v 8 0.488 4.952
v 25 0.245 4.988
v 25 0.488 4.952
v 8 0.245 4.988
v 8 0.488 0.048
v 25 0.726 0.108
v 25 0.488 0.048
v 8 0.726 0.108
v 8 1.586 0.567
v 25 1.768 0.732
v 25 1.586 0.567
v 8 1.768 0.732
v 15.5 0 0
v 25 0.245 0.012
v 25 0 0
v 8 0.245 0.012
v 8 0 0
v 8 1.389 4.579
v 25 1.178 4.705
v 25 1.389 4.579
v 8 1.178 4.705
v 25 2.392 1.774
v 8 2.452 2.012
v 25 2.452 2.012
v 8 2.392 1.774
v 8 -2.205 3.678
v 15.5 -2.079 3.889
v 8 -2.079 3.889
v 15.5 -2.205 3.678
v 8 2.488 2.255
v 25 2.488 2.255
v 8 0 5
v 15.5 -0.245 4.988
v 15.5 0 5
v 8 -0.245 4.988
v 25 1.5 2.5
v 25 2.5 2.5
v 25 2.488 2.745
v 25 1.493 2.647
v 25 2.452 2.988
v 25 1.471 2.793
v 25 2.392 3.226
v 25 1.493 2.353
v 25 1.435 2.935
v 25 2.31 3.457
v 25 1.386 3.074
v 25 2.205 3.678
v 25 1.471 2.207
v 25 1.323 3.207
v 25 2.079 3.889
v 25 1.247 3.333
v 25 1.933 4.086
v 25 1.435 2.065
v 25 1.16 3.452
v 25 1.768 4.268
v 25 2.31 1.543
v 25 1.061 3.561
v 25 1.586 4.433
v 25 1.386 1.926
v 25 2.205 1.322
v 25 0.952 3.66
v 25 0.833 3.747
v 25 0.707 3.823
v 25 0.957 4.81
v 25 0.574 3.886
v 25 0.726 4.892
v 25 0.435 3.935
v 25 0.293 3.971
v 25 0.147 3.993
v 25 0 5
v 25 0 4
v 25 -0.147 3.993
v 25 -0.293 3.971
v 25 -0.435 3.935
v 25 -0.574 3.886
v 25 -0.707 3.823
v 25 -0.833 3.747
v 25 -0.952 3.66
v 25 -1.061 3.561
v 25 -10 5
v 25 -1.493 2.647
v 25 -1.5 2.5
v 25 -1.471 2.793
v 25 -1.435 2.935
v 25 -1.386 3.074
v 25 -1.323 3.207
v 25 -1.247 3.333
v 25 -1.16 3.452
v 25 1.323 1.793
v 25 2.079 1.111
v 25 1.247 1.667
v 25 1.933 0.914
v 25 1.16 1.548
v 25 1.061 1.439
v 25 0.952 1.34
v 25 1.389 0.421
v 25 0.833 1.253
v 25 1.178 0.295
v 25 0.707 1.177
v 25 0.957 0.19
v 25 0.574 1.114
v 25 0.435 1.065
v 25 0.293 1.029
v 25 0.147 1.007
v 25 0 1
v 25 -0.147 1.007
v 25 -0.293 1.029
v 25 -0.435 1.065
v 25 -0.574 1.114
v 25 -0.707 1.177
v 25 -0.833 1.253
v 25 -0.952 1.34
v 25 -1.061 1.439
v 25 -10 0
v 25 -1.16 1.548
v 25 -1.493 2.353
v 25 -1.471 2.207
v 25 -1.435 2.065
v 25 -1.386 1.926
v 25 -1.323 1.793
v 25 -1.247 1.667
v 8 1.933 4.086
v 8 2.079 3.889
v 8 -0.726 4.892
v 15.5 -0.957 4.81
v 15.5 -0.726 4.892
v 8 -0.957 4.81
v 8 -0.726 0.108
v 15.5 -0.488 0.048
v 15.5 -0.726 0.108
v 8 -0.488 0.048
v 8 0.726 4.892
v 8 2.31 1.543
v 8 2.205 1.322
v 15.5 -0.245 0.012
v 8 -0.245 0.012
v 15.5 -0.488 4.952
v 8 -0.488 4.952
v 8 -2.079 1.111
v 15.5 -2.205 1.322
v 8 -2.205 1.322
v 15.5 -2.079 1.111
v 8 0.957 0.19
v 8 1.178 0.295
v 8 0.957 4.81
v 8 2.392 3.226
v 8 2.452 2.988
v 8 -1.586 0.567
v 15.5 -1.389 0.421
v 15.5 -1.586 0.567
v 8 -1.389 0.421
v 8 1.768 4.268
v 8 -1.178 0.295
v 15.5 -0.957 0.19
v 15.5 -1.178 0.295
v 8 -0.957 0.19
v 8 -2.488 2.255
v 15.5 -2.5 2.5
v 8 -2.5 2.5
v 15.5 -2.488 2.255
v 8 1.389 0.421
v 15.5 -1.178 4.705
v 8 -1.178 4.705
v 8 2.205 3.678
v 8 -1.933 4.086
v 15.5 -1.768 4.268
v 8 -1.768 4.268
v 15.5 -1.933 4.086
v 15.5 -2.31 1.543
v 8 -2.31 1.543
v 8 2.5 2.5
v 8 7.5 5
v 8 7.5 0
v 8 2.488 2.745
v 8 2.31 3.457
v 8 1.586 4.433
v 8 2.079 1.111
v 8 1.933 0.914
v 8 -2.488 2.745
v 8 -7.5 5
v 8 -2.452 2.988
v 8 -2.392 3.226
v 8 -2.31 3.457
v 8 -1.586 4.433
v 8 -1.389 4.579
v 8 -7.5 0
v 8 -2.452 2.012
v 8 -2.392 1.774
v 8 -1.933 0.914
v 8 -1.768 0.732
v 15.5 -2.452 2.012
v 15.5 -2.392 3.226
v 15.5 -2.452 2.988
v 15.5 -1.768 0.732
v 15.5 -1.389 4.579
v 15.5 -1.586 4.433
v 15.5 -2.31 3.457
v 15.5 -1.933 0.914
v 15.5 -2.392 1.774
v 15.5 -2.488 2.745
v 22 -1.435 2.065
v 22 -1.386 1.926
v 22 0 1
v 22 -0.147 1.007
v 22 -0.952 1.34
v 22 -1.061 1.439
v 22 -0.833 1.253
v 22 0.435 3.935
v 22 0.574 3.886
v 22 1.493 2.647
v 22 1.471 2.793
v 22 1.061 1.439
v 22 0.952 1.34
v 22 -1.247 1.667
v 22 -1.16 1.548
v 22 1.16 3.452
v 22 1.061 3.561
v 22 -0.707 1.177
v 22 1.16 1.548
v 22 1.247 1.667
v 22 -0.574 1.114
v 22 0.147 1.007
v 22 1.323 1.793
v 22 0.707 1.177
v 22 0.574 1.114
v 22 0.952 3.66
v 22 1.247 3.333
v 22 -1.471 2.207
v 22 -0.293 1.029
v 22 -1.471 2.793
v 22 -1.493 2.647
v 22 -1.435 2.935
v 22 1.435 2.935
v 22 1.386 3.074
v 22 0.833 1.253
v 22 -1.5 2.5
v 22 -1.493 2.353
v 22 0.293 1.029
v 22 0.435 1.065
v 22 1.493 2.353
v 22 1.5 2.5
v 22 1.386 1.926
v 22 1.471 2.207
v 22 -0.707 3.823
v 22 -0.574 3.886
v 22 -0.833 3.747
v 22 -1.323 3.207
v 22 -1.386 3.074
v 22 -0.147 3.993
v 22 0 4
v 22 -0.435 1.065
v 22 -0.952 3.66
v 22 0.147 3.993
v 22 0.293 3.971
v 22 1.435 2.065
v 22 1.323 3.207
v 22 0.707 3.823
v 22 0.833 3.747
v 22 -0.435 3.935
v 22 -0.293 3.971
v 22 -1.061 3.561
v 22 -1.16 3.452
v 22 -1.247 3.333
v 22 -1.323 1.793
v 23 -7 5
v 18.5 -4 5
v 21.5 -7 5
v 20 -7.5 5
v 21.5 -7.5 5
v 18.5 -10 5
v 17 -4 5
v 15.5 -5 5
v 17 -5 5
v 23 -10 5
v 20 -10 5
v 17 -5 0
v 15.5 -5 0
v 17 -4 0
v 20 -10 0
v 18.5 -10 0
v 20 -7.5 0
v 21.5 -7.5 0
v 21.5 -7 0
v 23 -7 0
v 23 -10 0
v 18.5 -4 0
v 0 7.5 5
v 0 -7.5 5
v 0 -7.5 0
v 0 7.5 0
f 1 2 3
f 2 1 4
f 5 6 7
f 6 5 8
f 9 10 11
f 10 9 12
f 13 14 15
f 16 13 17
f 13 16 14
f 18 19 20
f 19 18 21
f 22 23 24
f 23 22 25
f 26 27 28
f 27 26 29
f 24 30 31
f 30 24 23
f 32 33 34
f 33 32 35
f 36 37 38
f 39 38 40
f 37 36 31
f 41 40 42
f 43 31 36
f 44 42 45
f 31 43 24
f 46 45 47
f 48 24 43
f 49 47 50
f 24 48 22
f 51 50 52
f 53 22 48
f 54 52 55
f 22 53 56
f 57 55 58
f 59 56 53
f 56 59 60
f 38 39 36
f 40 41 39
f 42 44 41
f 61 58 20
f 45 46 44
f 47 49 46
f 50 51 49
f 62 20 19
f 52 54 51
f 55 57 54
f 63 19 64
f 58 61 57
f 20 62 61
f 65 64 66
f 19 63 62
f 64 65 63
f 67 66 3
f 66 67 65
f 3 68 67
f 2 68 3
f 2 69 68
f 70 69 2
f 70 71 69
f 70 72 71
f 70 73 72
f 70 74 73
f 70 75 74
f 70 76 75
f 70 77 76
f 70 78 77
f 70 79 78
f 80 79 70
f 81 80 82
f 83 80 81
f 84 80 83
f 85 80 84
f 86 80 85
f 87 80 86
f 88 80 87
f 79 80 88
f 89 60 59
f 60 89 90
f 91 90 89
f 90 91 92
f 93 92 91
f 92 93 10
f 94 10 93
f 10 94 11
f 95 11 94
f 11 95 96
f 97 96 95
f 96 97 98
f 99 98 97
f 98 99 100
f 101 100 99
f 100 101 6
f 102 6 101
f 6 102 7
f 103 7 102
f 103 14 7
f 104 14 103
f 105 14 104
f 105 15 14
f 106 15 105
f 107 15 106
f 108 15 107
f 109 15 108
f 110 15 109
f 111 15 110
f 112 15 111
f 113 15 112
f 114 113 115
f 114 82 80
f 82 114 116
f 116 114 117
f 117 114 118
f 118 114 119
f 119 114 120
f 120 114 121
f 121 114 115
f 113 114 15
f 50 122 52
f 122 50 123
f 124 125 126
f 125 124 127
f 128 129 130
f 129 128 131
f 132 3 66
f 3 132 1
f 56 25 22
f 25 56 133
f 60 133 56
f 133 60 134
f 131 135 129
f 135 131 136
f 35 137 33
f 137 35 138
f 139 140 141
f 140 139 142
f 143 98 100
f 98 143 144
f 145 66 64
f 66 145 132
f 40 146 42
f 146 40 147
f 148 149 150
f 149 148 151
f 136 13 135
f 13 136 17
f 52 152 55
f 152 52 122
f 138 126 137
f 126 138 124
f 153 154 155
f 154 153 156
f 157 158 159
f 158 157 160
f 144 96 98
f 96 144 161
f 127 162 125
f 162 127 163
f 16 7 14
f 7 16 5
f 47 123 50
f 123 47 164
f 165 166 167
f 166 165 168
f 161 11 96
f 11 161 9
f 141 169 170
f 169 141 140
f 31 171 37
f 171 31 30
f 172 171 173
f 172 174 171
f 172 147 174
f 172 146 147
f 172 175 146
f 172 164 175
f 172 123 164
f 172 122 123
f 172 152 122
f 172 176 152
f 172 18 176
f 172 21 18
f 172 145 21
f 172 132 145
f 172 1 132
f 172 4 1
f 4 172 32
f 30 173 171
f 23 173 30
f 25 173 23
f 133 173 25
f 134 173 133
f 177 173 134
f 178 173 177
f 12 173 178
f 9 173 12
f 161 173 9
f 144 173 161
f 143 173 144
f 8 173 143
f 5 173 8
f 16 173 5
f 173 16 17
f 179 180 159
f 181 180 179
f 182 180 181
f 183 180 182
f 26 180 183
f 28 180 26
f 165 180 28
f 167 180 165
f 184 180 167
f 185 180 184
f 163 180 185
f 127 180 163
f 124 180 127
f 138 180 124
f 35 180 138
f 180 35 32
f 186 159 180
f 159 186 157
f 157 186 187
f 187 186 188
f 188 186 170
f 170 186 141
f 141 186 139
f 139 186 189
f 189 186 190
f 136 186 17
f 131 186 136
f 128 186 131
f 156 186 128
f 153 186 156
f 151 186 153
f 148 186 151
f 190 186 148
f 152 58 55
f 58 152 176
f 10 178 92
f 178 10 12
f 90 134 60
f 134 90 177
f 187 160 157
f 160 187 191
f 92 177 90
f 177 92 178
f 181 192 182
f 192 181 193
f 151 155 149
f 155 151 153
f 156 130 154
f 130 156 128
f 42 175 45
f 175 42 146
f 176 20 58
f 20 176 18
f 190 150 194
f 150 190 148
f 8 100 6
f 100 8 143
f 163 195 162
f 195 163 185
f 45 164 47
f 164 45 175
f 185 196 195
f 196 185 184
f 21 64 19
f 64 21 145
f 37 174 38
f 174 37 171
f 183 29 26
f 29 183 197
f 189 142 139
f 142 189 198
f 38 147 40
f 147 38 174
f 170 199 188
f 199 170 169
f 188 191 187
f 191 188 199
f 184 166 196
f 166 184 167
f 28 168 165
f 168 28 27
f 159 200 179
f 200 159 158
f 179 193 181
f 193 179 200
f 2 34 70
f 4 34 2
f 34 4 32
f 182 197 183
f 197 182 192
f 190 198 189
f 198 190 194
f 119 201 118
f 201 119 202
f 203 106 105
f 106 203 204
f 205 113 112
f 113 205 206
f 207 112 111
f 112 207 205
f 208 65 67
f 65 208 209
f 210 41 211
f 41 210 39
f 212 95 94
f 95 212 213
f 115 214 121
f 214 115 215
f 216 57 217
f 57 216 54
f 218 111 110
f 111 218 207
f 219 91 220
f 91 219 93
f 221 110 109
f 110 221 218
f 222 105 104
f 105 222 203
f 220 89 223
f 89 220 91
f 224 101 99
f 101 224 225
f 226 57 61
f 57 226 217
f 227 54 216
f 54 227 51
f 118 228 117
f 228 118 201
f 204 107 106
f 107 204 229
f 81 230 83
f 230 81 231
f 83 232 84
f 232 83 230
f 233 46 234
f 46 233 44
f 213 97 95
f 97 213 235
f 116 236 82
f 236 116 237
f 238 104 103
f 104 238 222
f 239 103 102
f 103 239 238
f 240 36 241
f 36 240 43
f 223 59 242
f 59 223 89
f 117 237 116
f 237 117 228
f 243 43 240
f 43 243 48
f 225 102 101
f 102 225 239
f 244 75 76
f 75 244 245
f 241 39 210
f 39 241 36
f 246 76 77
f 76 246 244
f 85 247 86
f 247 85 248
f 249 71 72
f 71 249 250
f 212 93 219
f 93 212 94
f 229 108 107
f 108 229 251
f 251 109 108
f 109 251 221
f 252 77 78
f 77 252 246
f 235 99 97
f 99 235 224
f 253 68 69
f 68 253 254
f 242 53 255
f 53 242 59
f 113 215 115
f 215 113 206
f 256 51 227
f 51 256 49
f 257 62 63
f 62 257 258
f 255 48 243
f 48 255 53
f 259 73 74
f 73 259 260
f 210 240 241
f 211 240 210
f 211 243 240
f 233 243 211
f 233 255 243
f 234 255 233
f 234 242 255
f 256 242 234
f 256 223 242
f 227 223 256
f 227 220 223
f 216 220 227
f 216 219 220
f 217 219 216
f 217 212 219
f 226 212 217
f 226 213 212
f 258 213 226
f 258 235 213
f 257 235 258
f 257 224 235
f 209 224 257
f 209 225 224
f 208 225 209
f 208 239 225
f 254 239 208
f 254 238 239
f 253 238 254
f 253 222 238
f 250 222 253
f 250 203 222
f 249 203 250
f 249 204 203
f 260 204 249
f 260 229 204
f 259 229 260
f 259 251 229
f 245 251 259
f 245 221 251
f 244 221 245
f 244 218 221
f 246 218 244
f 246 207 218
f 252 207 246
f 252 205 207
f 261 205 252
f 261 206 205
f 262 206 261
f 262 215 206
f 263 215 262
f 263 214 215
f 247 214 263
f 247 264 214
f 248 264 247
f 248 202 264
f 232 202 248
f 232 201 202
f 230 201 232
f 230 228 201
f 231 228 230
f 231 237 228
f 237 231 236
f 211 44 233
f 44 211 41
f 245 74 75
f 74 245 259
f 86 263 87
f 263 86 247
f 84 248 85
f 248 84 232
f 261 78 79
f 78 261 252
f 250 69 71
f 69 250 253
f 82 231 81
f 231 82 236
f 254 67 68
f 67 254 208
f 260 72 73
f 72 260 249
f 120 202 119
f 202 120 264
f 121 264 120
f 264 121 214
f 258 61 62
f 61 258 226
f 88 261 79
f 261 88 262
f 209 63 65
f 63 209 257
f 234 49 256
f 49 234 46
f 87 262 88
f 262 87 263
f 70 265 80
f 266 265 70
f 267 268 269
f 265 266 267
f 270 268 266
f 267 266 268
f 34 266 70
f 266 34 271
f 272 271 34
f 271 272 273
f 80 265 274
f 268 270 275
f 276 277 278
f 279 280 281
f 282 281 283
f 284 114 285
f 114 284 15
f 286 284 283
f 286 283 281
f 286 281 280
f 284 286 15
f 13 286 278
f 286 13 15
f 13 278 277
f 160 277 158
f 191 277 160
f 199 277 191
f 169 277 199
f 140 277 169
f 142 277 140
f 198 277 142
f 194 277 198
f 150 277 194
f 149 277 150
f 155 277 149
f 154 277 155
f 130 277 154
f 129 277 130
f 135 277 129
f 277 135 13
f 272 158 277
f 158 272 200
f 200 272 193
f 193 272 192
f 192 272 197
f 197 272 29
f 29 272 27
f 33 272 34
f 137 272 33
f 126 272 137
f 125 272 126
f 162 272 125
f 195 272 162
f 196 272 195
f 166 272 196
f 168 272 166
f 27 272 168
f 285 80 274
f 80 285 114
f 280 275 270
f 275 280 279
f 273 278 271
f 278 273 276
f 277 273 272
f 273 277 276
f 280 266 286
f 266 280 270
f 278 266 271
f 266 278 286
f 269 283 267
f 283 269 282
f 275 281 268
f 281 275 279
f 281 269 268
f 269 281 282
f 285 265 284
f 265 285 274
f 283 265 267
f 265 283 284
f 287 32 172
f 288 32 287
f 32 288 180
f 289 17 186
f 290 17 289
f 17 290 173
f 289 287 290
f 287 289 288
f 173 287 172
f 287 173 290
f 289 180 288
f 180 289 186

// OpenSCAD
$fn = 64;

thick   =   5;

// L'anneau
anneau_width    =   8;
anneau_height   =   15;
anneau_thick    =   thick;

translate( [ 0, -anneau_height/2.0, 0] ) {
    cube(
        [
            anneau_width    ,
            anneau_height   ,
            anneau_thick
        ]
    );
}

// La tige
tige_width  =   17;
tige_thick  =   thick;

difference() {
    translate( [8, 0, tige_thick/2.0] ) {
        rotate( [0, 90, 0] ) {
            cylinder( tige_width, tige_thick/2.0, tige_thick/2.0 );
        }
    }

    translate( [8 + tige_width - 3, 0, tige_thick/2.0] ) {
        rotate( [0, 90, 0] ) {
            cylinder( 3, 3/2., 3/2. );
        }
    }
}

// Le Panneton
gorge_nb        =   5;
gorge_width     =   1.5;
gorge_thick     =   thick;

panneton_width  =   gorge_nb * gorge_width + 2;
panneton_height =   10;
panneton_thick  =   thick;

/// NEW
translate(
        [anneau_width + tige_width - panneton_width ,
        -panneton_height            ,
        0]
)
{
    panneton( gorge_width, panneton_thick );
}

module panneton( g_width, p_thick ) {
    difference() {
        cube(
            [
                panneton_width  ,
                panneton_height ,
                p_thick
            ]
        );

    translate( [ panneton_width-3, panneton_height, tige_thick/2.0] ) {
        rotate( [0, 90, 0] ) {
            cylinder( 3, 3/2., 3/2. );
        }
    }
        
        // Gorges en négatif
        // Gorge N°1
        translate( [0 * g_width, 0, 0]) {
            cube( [g_width, 5, p_thick] );
        }
        // Gorge N°2
        translate( [1 * g_width, 0, 0]) {
            cube( [g_width, 6, p_thick] );
        }
        
        // Gorge N°3
        translate( [2 * g_width, 0, 0]) {
            cube( [g_width, 0, p_thick] );
        }

        // Gorge N°4
        translate( [3 * g_width, 0, 0]) {
            cube( [g_width, 2.5, p_thick] );
        }

        // Gorge N°5
        translate( [4 * g_width, 0, 0]) {
            cube( [g_width, 3, p_thick] );
        }
    }
}
